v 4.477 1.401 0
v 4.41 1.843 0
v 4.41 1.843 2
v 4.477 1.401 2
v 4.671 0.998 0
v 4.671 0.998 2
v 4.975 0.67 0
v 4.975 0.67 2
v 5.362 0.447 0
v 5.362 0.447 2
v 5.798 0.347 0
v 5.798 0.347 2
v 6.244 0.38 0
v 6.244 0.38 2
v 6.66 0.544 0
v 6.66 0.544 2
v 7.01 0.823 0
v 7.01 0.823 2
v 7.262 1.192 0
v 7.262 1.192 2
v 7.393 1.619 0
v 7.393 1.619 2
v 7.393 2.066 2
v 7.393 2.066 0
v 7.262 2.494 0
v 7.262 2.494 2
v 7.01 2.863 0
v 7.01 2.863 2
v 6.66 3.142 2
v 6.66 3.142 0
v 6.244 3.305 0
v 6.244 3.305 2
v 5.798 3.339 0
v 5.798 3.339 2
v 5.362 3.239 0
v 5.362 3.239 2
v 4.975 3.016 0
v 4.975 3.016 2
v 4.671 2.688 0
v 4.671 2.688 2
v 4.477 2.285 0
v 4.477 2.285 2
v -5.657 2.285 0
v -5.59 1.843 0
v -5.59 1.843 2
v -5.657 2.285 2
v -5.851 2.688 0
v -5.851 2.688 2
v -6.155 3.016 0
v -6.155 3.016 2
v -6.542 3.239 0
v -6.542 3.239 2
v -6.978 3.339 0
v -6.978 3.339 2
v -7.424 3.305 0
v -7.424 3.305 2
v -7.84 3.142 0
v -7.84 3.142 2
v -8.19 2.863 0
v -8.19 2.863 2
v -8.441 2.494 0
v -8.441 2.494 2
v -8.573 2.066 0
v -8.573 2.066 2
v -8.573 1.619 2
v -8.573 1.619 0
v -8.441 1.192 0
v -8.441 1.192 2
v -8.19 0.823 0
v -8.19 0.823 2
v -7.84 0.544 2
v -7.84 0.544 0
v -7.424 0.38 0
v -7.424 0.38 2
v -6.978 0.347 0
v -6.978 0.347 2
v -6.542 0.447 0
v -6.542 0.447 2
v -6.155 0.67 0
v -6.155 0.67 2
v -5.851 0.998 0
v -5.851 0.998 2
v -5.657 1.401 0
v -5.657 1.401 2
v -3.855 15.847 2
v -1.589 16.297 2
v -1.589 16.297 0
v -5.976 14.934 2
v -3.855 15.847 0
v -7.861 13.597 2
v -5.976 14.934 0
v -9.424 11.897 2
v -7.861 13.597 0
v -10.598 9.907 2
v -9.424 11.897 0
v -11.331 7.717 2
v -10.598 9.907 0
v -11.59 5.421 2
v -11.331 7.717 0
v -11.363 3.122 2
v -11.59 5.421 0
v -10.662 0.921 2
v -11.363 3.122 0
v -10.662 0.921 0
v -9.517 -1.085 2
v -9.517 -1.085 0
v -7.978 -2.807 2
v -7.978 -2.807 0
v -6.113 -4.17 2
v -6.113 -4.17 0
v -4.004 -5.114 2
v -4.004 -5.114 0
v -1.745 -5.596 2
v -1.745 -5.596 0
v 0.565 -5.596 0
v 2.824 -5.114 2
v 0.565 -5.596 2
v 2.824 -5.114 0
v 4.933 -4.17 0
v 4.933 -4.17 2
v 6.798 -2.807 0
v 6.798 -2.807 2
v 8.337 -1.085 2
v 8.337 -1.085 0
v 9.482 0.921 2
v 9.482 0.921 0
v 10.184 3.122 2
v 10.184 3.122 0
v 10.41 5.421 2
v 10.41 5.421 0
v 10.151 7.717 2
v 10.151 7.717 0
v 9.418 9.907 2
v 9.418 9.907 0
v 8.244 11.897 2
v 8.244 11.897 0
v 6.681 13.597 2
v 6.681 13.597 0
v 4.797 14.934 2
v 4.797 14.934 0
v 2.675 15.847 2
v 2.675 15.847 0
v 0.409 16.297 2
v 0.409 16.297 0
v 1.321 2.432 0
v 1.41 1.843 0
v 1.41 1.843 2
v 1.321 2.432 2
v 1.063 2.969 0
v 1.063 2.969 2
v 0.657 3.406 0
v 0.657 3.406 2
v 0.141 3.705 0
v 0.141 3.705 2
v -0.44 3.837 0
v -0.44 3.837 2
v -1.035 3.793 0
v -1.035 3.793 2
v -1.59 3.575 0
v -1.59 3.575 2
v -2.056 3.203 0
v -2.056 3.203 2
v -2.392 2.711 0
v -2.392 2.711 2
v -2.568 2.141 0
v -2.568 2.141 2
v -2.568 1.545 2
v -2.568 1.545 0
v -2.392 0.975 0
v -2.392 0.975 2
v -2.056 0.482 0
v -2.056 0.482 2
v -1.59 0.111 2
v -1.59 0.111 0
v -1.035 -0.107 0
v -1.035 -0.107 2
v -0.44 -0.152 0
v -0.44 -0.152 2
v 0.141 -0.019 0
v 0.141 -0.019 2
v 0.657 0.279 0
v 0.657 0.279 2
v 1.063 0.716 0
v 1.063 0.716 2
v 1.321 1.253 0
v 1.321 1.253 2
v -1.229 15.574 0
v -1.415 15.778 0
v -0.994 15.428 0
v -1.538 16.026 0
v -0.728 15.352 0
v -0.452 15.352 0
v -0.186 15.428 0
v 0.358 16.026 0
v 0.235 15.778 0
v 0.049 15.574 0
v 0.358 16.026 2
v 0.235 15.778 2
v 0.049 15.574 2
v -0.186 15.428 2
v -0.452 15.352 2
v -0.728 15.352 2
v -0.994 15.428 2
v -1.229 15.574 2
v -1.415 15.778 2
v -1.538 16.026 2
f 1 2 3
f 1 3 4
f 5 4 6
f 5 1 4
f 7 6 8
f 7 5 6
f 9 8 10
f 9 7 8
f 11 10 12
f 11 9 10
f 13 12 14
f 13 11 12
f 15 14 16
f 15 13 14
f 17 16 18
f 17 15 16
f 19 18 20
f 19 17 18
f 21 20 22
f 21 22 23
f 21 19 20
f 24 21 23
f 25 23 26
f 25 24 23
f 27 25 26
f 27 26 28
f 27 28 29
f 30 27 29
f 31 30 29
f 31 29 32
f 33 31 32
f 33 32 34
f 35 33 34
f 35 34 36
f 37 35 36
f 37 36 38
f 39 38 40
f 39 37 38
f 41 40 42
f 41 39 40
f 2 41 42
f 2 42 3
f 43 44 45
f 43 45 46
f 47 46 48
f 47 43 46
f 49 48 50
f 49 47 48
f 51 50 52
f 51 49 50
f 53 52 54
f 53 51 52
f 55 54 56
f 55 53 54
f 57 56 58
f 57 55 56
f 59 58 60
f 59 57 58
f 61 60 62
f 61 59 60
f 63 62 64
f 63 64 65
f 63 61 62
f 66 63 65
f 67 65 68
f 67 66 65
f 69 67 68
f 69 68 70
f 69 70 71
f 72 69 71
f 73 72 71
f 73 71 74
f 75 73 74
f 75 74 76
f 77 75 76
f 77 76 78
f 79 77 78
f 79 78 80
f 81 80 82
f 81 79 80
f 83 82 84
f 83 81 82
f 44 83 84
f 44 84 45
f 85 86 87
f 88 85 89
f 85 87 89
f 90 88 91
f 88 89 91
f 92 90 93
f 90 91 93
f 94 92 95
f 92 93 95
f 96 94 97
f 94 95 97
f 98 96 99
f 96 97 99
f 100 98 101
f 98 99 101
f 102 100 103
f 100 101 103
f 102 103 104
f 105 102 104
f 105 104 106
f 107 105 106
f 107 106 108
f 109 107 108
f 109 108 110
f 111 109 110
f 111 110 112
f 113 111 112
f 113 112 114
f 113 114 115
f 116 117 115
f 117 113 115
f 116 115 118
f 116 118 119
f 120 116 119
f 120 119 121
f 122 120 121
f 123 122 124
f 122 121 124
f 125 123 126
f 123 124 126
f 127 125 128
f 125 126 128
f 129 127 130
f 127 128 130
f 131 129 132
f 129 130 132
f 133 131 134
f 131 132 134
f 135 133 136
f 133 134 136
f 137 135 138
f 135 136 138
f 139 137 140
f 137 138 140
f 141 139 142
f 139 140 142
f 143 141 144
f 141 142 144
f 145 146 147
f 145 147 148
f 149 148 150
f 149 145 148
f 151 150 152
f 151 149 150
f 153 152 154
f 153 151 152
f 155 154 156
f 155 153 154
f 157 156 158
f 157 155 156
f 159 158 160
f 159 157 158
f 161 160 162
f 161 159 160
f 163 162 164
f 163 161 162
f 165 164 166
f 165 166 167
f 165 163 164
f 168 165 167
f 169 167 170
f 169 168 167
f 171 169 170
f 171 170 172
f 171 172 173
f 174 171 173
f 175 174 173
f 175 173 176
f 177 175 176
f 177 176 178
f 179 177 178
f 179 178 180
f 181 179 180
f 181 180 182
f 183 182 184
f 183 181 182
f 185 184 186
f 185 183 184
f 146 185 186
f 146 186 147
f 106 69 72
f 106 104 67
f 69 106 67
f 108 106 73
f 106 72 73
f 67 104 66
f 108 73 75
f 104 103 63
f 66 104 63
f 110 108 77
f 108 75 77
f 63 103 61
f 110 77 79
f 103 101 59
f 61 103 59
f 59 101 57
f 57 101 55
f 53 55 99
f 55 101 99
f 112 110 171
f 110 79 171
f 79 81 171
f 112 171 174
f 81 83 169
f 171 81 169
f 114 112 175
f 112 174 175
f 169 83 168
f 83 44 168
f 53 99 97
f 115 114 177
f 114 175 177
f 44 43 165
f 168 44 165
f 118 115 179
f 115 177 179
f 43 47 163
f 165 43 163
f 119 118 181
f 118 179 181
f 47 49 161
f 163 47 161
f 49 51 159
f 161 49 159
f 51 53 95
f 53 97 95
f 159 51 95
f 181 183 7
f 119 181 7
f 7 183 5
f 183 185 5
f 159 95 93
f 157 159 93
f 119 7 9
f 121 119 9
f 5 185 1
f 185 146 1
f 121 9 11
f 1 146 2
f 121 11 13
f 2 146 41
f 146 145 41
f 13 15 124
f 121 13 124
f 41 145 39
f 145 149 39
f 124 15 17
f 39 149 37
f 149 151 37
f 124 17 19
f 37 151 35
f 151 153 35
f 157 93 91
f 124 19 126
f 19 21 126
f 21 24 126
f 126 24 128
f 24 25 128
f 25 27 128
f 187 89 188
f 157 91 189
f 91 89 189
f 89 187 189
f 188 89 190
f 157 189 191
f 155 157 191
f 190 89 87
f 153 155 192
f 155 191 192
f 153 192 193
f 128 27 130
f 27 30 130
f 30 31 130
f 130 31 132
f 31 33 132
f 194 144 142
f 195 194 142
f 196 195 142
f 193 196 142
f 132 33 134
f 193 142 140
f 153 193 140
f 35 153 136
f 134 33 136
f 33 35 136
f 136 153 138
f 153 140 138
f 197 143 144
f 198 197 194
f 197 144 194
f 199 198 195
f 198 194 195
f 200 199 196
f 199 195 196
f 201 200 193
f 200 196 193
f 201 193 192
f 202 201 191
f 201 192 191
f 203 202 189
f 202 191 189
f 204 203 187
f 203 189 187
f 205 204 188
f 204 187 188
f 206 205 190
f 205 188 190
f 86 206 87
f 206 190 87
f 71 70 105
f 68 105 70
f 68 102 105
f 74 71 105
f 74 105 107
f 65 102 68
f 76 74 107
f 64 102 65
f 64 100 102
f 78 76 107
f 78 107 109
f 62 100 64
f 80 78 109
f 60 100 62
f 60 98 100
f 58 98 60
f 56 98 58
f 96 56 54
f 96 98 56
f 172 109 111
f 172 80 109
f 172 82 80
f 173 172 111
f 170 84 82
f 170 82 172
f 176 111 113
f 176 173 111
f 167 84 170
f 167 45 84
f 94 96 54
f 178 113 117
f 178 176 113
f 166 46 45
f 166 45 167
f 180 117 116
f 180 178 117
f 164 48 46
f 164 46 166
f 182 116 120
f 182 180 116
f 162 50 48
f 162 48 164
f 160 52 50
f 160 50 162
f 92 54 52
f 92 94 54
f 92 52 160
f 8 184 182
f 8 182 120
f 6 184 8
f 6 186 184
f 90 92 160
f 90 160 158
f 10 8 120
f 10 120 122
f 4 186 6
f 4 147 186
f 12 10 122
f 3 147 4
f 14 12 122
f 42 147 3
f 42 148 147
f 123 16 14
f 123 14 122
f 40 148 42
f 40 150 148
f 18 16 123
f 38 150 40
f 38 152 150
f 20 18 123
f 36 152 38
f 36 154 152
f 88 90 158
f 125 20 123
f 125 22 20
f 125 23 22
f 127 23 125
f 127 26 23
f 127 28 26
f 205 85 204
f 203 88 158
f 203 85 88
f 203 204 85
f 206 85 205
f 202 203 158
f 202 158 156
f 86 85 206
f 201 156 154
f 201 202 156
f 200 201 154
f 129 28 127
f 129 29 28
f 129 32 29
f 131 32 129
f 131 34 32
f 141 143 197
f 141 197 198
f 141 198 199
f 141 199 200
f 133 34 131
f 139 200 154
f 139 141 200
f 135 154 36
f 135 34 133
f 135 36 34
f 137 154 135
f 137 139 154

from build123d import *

# Parameters (mm, degrees)
SKETCH_1_R          = 11
SKETCH_1_R_2        = 1.5
SKETCH_1_R_3        = 2
EXTRUDE_1_DEPTH     = 2
SKETCH_2_R          = 1
CUT_EXTRUDE_1_DEPTH = 10


with BuildPart() as part:
    # 草图1 → 凸台-拉伸1 (new body)
    with BuildSketch(Plane.XY):
        with Locations((-0.589945763, 5.342825614)):
            Circle(SKETCH_1_R)
        with Locations((-7.089945763, 1.842825614)):
            Circle(SKETCH_1_R_2, mode=Mode.SUBTRACT)
        with Locations(Location((5.910054237, 1.842825614, 0), (0, 0, 180))):
            Circle(SKETCH_1_R_2, mode=Mode.SUBTRACT)
        with Locations((-0.589945763, 1.842825614)):
            Circle(SKETCH_1_R_3, mode=Mode.SUBTRACT)
    extrude(amount=EXTRUDE_1_DEPTH)

    # 草图2 → 切除-拉伸1 (cut)
    with BuildSketch(Plane(origin=(0, 0, 0), x_dir=(-1, 0, 0), z_dir=(0, 0, -1))):
        with Locations((0.589945763, 16.342825614)):
            Circle(SKETCH_2_R)
    extrude(amount=-CUT_EXTRUDE_1_DEPTH, mode=Mode.SUBTRACT)


solid = part.part
